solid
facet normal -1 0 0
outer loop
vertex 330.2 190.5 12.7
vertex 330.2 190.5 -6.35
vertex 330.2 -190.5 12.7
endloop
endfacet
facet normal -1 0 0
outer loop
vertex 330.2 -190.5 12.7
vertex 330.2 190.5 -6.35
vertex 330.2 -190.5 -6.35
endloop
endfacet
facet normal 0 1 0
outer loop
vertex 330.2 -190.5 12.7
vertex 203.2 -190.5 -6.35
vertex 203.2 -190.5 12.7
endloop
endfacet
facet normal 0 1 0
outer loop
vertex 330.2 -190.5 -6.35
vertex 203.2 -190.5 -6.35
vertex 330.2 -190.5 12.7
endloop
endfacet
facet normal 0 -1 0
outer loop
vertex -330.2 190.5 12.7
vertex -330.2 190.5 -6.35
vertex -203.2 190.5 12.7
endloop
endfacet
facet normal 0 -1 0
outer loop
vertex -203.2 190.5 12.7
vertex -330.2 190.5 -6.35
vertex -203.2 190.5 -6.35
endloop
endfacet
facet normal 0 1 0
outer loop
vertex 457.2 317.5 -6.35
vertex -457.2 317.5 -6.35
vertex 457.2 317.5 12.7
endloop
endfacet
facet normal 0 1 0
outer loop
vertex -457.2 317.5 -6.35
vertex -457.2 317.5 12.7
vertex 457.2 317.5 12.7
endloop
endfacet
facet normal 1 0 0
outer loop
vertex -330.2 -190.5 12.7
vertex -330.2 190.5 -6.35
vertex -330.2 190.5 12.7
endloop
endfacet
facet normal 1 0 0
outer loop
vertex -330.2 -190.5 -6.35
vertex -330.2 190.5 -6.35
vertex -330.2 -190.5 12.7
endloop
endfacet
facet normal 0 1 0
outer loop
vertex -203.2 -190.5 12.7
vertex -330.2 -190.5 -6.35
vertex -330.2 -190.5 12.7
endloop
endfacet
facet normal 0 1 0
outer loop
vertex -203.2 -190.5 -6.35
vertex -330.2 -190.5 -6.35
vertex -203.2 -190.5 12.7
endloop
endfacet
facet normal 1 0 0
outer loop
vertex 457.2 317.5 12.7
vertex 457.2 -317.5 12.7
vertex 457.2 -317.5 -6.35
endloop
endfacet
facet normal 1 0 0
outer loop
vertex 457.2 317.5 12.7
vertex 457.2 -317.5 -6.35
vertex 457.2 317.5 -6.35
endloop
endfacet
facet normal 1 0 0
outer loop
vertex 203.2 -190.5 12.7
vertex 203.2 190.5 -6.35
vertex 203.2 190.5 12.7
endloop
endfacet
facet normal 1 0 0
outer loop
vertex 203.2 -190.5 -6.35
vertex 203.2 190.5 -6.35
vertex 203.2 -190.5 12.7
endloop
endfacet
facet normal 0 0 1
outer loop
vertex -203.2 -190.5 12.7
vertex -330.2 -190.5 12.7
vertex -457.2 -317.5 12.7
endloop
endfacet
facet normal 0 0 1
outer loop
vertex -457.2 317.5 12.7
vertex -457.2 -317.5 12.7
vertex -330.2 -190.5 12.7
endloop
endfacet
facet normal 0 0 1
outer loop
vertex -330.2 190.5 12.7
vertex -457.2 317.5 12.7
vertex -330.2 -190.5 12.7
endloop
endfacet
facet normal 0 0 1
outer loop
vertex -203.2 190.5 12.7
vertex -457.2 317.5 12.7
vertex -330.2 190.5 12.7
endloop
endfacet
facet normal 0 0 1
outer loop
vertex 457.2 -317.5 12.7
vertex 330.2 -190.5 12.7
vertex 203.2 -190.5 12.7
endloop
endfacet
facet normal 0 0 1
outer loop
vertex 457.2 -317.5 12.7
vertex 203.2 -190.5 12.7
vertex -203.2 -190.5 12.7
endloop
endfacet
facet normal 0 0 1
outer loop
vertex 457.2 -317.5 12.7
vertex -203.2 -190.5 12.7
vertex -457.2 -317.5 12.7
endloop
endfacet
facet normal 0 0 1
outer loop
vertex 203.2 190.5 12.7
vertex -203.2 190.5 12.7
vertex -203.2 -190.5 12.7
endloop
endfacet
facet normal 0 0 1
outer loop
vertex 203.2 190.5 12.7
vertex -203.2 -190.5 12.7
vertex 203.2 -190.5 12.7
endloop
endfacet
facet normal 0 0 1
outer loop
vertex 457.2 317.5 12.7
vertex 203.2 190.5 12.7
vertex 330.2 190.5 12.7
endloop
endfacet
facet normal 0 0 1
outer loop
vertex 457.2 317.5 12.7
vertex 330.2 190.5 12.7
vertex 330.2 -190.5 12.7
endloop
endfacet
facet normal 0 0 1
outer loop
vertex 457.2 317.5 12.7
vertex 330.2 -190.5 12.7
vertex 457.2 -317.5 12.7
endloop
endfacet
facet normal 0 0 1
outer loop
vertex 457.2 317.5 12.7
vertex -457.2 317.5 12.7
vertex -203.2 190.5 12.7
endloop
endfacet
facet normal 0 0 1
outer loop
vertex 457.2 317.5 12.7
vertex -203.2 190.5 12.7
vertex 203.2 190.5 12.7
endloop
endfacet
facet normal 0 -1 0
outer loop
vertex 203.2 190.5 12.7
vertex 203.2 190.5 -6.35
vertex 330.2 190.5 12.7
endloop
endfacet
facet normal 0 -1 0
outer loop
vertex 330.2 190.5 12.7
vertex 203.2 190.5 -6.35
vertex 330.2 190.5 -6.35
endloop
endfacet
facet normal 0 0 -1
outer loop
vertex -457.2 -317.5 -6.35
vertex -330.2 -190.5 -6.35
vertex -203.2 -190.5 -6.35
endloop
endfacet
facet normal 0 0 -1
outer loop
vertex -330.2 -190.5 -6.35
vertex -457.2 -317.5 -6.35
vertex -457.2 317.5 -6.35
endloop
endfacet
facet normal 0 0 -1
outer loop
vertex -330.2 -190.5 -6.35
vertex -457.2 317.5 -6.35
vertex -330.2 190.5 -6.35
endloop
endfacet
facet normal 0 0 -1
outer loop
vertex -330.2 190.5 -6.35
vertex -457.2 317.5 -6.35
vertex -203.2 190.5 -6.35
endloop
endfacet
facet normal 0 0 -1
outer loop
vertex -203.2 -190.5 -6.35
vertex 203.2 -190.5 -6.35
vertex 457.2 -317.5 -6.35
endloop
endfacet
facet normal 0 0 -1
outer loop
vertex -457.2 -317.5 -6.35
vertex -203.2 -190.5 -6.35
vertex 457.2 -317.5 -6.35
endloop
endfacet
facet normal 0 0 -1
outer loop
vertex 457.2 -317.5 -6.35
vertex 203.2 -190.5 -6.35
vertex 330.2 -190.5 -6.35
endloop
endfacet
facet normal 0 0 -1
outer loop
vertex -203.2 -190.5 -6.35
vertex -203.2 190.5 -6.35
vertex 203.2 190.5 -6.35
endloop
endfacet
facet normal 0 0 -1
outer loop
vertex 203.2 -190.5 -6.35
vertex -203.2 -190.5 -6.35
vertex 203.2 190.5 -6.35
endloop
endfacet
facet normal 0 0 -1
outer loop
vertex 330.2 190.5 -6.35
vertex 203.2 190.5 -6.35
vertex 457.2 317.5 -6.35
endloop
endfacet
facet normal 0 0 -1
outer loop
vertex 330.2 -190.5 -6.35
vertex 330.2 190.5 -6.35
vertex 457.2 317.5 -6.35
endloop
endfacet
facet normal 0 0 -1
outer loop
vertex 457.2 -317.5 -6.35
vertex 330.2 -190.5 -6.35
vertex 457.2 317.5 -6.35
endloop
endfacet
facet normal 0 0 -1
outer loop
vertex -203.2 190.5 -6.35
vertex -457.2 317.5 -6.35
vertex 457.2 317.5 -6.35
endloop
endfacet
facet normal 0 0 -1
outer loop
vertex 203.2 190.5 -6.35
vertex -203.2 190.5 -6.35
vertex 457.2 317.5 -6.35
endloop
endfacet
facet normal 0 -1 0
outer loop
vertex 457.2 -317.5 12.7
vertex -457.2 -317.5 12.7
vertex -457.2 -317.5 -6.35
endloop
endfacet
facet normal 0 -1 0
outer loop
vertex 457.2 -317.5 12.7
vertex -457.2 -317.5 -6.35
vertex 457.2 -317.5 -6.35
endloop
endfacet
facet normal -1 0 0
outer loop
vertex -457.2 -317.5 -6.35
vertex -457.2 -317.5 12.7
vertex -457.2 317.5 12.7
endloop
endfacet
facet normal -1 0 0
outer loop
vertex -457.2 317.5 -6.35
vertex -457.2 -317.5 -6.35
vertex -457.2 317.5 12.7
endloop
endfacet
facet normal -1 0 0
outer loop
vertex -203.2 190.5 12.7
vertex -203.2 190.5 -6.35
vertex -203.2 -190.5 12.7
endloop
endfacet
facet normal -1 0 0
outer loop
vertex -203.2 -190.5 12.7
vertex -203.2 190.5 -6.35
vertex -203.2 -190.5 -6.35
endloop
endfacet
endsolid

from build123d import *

# Parameters (mm, degrees)
F0_W     = 914.4
F0_H     = 635
F1_DEPTH = 6.35
F2_DEPTH = 12.7
F3_W     = 127
F3_H     = 381
F4_DEPTH = 73.66


with BuildPart() as f1:
    # F0 (on Top) → F1 (new body, symmetric)
    with BuildSketch(Plane.XY):
        Rectangle(F0_W, F0_H)
    extrude(amount=F1_DEPTH, both=True)

    # F0 (on Top) → F2 (join)
    with BuildSketch(Plane.XY):
        Rectangle(F0_W, F0_H)
    extrude(amount=F2_DEPTH)

    # F3 (on face) → F4 (cut)
    with BuildSketch(Plane(origin=(0, 0, -6.35), x_dir=(1, 0, 0), z_dir=(0, 0, -1))):
        with Locations((-266.7, 0)):
            Rectangle(F3_W, F3_H)
        with Locations((266.7, 0)):
            Rectangle(F3_W, F3_H)
    extrude(amount=-F4_DEPTH, mode=Mode.SUBTRACT)


solid = f1.part
